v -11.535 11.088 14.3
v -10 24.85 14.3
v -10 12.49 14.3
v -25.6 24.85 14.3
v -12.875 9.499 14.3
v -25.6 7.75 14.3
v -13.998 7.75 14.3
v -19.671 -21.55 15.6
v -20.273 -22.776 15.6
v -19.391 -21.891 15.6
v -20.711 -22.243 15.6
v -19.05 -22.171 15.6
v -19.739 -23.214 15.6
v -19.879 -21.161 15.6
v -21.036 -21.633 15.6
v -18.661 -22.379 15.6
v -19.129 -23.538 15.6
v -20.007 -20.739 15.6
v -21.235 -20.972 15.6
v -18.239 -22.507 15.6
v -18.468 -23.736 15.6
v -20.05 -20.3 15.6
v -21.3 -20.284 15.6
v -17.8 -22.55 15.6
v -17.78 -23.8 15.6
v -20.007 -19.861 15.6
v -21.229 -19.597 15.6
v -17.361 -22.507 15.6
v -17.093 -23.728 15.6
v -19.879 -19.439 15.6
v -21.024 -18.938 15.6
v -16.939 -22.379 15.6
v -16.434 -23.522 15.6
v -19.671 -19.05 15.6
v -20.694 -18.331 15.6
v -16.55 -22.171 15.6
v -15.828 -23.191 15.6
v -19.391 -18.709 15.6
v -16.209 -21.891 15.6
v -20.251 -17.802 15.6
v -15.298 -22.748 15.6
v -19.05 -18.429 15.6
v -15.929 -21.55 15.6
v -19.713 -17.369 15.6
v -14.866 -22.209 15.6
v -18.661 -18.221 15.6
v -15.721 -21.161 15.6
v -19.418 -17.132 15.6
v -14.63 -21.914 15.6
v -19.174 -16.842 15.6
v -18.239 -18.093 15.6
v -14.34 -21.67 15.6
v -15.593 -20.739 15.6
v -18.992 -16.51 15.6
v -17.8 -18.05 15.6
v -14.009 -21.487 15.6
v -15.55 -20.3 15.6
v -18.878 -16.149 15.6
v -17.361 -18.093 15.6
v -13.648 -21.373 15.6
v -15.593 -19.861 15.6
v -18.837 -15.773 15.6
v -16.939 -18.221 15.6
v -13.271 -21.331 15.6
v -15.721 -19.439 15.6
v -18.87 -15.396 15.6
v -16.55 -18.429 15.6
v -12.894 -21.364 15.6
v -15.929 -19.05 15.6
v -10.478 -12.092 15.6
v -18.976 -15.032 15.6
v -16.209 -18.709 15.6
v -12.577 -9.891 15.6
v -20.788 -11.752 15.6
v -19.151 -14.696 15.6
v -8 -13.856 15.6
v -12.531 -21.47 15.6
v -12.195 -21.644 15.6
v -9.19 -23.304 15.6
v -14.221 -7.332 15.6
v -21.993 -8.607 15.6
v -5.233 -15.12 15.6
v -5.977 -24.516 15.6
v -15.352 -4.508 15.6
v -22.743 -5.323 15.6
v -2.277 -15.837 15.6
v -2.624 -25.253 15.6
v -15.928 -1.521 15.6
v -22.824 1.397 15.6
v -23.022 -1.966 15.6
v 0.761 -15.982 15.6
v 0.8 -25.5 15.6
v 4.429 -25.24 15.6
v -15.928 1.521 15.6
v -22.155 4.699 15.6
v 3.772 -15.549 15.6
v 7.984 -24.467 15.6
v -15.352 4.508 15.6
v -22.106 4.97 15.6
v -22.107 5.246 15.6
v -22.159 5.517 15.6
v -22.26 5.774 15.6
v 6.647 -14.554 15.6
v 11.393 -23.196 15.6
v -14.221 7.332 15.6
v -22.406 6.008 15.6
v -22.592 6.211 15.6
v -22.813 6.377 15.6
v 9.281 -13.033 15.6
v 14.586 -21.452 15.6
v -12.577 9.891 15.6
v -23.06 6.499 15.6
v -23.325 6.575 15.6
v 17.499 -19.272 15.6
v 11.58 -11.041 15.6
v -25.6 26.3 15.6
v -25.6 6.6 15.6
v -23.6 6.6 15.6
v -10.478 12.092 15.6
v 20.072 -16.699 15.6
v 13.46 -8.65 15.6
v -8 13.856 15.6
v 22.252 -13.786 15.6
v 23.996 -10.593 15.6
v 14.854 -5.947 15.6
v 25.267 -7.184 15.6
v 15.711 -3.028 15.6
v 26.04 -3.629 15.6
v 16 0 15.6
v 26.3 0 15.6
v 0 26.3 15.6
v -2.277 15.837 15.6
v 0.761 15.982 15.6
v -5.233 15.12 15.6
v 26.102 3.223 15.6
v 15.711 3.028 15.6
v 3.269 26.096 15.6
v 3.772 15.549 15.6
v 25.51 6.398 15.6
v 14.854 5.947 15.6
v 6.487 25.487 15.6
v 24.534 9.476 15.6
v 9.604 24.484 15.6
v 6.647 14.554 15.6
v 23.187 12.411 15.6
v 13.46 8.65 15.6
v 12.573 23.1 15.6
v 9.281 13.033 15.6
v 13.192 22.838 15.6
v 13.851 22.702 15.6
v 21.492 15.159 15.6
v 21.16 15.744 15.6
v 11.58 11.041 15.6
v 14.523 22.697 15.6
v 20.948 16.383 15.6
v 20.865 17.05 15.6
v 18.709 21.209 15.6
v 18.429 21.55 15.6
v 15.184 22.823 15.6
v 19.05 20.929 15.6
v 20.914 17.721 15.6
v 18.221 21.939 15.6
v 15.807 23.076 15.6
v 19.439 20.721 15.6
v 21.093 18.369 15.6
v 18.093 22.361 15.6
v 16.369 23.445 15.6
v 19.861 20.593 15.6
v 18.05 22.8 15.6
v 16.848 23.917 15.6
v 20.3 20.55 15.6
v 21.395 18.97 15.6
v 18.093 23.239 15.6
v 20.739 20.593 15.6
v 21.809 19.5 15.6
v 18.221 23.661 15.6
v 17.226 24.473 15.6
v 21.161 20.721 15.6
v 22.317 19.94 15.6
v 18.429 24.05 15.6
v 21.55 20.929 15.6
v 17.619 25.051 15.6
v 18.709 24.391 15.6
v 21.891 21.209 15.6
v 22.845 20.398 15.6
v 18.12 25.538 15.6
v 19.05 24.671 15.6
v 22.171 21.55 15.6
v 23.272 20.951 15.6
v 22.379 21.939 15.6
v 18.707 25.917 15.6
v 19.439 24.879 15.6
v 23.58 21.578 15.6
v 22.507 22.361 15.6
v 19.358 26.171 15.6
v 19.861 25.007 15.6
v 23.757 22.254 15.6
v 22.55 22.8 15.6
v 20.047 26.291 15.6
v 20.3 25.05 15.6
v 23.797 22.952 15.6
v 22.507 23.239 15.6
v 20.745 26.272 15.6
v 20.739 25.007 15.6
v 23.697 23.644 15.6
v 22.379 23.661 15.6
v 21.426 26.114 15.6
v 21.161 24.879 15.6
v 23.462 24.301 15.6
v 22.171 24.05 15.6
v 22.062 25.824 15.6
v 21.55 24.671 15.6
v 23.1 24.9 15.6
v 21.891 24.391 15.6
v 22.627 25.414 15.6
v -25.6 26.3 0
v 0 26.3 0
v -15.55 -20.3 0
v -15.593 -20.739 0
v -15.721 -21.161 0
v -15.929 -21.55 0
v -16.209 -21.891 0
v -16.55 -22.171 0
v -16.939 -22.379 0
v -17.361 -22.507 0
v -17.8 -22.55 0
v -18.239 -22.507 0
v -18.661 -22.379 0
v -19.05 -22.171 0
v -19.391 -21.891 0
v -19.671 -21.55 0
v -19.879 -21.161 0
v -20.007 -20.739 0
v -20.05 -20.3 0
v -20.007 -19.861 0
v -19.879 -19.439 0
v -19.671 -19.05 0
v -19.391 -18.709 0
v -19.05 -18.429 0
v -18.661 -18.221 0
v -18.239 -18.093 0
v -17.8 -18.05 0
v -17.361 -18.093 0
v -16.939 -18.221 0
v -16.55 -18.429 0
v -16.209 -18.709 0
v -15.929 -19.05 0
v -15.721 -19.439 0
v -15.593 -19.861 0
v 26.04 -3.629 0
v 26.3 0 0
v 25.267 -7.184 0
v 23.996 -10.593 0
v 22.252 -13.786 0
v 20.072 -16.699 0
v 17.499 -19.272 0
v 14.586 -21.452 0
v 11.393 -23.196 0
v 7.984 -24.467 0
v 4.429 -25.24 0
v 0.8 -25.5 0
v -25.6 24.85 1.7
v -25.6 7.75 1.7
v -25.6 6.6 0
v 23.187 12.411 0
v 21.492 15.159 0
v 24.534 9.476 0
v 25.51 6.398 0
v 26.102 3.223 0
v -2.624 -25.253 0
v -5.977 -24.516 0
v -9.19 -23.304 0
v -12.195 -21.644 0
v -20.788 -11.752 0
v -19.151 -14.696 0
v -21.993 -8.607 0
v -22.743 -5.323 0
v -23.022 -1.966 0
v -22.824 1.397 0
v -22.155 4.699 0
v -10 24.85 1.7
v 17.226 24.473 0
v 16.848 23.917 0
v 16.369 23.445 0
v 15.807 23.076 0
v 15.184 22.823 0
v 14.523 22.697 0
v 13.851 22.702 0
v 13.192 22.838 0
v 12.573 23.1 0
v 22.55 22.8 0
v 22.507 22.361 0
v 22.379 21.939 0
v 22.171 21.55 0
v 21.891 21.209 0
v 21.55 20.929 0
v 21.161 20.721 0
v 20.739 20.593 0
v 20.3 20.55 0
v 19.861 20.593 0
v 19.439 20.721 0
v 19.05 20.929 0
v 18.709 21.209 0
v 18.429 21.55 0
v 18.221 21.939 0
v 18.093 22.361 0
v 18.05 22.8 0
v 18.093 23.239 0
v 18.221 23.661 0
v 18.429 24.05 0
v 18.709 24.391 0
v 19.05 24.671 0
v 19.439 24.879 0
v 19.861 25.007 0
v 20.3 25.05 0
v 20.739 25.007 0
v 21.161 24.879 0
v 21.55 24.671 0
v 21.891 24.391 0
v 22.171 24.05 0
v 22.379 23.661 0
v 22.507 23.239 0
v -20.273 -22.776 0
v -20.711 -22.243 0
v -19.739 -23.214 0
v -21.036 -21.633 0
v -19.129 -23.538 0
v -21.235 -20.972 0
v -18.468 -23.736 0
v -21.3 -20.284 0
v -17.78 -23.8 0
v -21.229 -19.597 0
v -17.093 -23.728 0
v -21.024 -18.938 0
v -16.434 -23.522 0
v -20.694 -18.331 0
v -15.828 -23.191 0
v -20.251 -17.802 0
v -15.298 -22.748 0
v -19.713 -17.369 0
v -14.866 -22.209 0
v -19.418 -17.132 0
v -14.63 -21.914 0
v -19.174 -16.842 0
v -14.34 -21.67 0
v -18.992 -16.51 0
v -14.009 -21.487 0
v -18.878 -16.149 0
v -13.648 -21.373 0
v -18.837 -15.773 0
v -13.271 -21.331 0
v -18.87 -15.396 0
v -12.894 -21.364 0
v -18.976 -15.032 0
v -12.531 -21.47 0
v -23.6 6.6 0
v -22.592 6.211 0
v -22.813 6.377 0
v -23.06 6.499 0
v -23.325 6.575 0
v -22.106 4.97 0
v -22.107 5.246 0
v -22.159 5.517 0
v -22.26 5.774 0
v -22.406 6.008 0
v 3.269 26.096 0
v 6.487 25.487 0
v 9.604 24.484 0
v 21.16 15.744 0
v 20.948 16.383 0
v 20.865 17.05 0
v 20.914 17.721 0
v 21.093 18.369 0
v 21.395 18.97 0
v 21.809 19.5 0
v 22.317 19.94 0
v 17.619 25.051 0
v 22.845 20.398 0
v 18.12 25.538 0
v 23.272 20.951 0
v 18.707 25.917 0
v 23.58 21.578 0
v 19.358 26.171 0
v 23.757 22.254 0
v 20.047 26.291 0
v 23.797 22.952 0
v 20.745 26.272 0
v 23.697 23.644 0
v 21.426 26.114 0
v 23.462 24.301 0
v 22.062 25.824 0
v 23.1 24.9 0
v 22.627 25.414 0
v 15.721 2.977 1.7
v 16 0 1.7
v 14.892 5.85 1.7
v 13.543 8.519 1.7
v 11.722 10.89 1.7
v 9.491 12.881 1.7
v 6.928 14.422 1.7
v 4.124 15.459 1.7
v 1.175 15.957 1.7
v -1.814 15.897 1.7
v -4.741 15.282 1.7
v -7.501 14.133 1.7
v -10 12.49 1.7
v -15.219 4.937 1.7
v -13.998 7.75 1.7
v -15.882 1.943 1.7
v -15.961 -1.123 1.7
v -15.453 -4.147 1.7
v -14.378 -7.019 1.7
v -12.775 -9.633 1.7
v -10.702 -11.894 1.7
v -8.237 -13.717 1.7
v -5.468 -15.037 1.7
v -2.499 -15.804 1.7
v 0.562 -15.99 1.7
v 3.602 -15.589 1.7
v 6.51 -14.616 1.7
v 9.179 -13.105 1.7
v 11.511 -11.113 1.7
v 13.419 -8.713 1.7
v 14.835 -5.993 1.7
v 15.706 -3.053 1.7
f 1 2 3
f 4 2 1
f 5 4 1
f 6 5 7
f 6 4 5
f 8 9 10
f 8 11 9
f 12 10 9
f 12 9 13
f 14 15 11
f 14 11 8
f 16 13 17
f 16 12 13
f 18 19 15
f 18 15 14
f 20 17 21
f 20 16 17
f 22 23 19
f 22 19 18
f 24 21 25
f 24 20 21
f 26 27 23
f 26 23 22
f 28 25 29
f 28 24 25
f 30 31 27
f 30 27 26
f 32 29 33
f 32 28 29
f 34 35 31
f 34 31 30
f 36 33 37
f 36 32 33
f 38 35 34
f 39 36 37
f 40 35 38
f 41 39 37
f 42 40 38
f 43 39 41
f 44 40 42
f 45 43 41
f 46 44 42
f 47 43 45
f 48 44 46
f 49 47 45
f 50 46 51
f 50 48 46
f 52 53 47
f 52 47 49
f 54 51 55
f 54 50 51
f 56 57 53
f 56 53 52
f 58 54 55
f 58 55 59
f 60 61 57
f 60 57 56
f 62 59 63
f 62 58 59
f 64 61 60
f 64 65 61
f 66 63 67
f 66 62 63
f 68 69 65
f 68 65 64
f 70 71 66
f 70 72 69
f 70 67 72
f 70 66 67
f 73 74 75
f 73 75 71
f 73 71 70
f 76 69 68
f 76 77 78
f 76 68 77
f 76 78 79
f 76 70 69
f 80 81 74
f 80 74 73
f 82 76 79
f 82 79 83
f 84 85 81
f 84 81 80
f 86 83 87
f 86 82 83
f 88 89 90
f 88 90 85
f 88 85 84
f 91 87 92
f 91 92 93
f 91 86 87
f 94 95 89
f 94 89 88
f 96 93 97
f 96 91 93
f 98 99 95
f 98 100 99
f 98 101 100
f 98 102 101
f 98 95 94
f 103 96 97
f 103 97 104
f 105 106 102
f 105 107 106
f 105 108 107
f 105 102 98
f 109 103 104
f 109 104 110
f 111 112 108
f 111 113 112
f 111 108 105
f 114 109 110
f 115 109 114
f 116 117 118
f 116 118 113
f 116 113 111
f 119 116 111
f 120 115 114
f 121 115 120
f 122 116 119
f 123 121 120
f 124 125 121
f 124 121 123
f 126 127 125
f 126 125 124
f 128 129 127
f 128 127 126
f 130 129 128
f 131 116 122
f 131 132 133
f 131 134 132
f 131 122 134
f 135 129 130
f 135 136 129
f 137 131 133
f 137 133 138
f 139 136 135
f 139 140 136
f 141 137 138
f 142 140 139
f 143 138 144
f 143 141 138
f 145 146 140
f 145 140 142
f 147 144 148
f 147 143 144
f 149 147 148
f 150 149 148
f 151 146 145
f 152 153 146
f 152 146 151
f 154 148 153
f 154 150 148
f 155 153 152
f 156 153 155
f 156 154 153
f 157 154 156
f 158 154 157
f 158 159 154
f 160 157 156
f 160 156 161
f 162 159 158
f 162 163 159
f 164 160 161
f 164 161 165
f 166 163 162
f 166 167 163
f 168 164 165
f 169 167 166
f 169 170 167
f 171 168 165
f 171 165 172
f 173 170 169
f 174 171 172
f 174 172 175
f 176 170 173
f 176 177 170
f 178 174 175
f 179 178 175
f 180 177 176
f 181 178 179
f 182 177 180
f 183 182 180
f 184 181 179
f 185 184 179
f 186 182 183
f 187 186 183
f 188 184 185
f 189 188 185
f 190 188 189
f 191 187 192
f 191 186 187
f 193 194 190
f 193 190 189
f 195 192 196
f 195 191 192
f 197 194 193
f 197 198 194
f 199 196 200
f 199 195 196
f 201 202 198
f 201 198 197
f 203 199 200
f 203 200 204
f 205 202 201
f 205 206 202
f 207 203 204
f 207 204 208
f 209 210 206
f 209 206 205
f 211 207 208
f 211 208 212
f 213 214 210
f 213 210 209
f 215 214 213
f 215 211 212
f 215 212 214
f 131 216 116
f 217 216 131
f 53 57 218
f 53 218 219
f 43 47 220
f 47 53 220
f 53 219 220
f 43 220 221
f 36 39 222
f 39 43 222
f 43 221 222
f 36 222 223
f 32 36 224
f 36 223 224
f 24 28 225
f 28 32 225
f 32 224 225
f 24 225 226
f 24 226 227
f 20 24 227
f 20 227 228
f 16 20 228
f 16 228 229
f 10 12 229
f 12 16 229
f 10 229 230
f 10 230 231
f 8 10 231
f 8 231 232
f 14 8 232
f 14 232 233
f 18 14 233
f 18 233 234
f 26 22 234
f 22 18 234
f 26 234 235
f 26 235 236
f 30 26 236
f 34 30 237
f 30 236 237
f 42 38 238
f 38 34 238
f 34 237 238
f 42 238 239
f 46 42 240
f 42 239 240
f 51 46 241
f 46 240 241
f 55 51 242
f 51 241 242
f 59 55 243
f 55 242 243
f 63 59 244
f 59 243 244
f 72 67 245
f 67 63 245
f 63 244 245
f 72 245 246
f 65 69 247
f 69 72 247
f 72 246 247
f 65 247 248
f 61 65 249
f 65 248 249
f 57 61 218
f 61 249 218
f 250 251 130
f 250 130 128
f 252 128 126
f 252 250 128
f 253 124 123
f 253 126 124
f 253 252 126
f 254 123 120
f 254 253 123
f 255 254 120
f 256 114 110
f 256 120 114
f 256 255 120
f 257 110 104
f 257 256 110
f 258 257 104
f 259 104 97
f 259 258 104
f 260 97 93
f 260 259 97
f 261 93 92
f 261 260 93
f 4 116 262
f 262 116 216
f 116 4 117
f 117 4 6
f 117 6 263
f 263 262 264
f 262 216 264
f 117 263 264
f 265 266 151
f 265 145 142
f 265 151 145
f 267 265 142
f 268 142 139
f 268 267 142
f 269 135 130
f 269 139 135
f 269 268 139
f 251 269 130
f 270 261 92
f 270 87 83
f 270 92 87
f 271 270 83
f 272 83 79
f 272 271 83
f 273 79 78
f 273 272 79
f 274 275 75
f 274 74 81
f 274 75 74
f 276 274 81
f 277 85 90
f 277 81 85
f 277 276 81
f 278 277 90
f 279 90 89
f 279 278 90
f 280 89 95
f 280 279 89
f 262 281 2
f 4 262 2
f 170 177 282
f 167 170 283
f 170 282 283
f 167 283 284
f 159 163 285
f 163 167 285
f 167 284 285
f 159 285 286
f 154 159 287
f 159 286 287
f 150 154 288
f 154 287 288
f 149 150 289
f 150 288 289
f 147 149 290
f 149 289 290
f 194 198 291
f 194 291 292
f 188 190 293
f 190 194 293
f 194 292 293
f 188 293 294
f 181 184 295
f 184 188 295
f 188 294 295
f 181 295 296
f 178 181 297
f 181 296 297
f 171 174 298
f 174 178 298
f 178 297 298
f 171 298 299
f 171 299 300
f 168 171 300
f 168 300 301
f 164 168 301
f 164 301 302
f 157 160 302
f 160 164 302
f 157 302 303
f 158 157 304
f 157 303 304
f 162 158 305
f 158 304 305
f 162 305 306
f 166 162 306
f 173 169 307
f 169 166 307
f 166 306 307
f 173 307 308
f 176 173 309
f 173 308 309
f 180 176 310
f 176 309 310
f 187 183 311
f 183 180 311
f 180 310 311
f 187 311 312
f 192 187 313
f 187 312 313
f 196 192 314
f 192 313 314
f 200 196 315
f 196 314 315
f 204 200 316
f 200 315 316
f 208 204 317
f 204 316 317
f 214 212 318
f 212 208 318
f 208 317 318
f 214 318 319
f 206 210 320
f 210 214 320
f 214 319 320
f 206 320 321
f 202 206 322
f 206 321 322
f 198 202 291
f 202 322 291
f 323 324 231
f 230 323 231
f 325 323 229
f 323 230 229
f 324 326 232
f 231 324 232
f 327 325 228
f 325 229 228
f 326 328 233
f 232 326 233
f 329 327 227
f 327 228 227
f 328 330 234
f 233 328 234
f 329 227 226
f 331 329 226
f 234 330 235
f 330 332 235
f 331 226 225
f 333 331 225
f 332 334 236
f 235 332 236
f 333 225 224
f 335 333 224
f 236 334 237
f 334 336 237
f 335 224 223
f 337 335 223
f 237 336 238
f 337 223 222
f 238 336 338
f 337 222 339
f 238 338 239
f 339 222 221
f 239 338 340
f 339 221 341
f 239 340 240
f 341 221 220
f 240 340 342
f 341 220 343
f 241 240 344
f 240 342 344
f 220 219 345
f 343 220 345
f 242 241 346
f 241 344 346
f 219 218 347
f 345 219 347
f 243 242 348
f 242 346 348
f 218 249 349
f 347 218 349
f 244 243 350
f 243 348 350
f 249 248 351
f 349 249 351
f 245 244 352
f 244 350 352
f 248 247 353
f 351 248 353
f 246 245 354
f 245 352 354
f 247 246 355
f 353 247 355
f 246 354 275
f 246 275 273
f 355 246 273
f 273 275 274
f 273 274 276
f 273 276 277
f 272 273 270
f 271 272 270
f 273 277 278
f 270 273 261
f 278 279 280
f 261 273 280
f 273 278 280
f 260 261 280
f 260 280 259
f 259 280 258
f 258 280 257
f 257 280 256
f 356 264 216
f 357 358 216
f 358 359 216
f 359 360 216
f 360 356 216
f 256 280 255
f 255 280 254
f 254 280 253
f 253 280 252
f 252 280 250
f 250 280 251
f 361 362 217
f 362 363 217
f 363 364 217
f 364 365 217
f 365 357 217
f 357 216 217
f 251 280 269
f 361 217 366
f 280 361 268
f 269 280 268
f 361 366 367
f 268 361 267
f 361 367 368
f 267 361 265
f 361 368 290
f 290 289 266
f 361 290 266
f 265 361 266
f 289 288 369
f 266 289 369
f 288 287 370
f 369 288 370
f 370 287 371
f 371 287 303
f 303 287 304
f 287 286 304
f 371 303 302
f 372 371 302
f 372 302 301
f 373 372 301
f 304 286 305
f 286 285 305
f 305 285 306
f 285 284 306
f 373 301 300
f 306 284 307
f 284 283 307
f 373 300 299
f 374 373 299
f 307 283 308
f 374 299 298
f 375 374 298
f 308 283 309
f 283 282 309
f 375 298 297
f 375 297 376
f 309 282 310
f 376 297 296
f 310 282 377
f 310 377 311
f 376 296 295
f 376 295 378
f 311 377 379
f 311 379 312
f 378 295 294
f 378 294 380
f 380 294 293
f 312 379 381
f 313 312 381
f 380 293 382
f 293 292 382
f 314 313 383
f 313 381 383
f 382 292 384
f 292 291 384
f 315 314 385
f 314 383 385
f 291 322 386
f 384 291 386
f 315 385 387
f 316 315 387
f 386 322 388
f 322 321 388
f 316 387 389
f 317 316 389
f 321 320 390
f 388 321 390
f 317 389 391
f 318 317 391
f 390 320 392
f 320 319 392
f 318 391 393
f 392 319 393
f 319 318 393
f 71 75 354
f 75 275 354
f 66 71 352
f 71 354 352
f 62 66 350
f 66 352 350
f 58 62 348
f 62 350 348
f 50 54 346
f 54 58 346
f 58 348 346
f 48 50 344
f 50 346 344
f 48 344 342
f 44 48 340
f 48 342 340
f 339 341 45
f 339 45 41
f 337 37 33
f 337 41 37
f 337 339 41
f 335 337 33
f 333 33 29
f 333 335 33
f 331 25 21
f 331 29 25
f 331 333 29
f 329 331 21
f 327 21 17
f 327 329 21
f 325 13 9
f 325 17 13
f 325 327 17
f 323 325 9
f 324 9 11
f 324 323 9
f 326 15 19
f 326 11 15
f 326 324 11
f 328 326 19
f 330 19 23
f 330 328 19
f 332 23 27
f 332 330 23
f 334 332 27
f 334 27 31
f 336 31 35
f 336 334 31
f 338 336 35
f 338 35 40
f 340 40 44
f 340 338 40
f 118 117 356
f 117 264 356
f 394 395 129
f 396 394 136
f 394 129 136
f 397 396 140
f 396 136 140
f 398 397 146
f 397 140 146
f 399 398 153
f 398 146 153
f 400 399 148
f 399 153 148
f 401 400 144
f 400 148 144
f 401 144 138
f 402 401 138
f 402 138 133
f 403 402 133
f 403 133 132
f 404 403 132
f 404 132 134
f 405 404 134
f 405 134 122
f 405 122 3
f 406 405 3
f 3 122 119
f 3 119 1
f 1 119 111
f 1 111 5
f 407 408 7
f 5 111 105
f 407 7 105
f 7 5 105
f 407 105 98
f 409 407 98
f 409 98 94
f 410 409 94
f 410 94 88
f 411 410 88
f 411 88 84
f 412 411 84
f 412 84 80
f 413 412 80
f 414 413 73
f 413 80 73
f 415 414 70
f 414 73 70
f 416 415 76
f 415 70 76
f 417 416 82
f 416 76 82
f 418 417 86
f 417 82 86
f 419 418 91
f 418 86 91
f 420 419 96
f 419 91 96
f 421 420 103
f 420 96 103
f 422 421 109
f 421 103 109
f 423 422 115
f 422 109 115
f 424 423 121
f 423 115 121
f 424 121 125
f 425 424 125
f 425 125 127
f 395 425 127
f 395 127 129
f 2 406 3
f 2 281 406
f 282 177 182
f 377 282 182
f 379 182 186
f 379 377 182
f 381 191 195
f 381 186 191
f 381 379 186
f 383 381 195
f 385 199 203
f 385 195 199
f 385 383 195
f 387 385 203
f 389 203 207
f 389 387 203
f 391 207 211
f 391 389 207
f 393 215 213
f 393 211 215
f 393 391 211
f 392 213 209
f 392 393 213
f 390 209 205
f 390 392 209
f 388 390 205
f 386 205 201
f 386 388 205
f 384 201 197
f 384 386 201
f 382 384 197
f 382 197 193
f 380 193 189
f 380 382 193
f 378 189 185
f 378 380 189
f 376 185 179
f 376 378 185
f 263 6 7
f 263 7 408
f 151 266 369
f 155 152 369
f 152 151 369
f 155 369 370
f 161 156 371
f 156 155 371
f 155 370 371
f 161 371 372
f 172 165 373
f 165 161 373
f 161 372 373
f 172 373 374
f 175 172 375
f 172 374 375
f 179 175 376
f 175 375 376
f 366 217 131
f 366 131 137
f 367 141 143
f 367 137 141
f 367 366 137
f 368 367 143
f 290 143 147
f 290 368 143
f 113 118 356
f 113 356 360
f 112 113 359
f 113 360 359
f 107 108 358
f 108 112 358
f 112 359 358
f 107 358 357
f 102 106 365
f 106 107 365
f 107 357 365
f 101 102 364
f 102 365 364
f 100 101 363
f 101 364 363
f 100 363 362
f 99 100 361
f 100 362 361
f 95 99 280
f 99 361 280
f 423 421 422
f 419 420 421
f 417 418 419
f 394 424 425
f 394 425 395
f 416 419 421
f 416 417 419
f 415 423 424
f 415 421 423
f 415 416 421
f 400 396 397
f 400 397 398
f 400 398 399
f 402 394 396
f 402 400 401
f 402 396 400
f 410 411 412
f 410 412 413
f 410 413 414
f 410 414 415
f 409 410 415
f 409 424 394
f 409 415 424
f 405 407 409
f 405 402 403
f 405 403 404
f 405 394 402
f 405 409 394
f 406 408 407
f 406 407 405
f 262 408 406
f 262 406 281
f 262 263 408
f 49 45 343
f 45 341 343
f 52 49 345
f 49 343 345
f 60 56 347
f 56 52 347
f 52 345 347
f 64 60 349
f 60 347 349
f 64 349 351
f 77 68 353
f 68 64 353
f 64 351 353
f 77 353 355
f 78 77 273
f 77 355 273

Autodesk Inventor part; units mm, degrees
ref_plane "YZ Plane" through (0, 0, 0) normal (1, 0, 0) x (0, 1, 0)
ref_plane "XZ Plane" through (0, 0, 0) normal (0, 1, 0) x (-1, 0, 0)
ref_plane "XY Plane" through (0, 0, 0) normal (0, 0, 1) x (1, 0, 0)
sketch "Sketch1" plane through (0, 0, 0) normal (0, 0, 1) x (1, 0, 0)
  line L0 (-25.6, 26.3) -> (-25.6, 6.6)
  line L1 (-25.6, 26.3) -> (0, 26.3)
  line L2 (0, 26.3) -> (0, 0) construction
  line L3 (0, 0) -> (26.3, 0)
  arc A0 (26.3, 0) -> (21.4915, 15.1594) centre (0, 0) ccw
  line L4 (-25.6, 6.6) -> (-23.6, 6.6)
  circle A1 centre (-17.8, -20.3) radius 2.25
  arc A2 (0.8, -25.5) -> (26.3, 0) centre (0.8, 0) ccw
  line L5 (-6.4086, -25.5) -> (23, -25.5) construction
  arc A3 (-22.1547, 4.6986) -> (-23.6, 6.6) centre (-23.6, 5.1) ccw
  circle A4 centre (20.3, 22.8) radius 2.25
  arc A5 (-22.1547, 4.6986) -> (-19.151, -14.6964) centre (0.8, -1.6765) ccw
  arc A6 (-19.7128, -17.3689) -> (-19.151, -14.6964) centre (-20.7682, -15.7518) ccw
  arc A7 (-12.1947, -21.6439) -> (-14.8665, -22.2091) centre (-13.248, -23.2624) ccw
  arc A8 (-19.7128, -17.3689) -> (-14.8665, -22.2091) centre (-17.8, -20.3) ccw
  arc A9 (-12.1947, -21.6439) -> (0.8, -25.5) centre (0.8, -1.6765) ccw
  arc A10 (22.3174, 19.9399) -> (17.2258, 24.4732) centre (20.3, 22.8) ccw
  arc A11 (12.5728, 23.1001) -> (17.2258, 24.4732) centre (14.2128, 26.1131) ccw
  arc A12 (22.3174, 19.9399) -> (21.4915, 15.1594) centre (24.2947, 17.1367) ccw
  arc A13 (12.5728, 23.1001) -> (0, 26.3) centre (0, 0) ccw
  dimension "d1" = 25.6
  dimension "d2" = 19.7
  dimension "d6" = 4.5
  dimension "d8" = 17.8
  dimension "d9" = 26.3
  dimension "d10" = 51.8
  dimension "d11" = 20.3
  dimension "d12" = 1.5
  dimension "d13" = 4.5
  dimension "d14" = 22.8
  dimension "d15" = 20.3
  dimension "d16" = 2
  dimension "d18" = 90
  dimension "d19" = 90
  dimension "d20" = 1.25
  dimension "d21" = 1.25
  dimension "d22" = 90
  dimension "d23" = 90
extrude "Extrusion1" add sketch "Sketch1" along normal blind 15.6
sketch "Sketch2" plane through (-25.6, 6.6, 0) normal (-1, 0, 0) x (0, 0, 1)
  line L0 (1.7, 18.25) -> (14.3, 18.25)
  line L1 (14.3, 18.25) -> (14.3, 1.15)
  line L2 (14.3, 1.15) -> (1.7, 1.15)
  line L3 (1.7, 1.15) -> (1.7, 18.25)
  point P0 (0, -6.6)
  point P1 (0, 19.7)
  dimension "d26" = 12.6
  dimension "d27" = 17.1
  dimension "d28" = 1.7
  dimension "d29" = 1.45
extrude "Extrusion2" cut sketch "Sketch2" against normal blind 15.6
sketch "Sketch3" plane through (0, 0, 15.6) normal (0, 0, 1) x (1, 0, 0)
  circle A0 centre (0, 0) radius 16
  dimension "d32" = 32
extrude "Extrusion3" cut sketch "Sketch3" against normal blind 13.9
properties part number "5015 RADIAL FAN" material "PBT Plastic"
